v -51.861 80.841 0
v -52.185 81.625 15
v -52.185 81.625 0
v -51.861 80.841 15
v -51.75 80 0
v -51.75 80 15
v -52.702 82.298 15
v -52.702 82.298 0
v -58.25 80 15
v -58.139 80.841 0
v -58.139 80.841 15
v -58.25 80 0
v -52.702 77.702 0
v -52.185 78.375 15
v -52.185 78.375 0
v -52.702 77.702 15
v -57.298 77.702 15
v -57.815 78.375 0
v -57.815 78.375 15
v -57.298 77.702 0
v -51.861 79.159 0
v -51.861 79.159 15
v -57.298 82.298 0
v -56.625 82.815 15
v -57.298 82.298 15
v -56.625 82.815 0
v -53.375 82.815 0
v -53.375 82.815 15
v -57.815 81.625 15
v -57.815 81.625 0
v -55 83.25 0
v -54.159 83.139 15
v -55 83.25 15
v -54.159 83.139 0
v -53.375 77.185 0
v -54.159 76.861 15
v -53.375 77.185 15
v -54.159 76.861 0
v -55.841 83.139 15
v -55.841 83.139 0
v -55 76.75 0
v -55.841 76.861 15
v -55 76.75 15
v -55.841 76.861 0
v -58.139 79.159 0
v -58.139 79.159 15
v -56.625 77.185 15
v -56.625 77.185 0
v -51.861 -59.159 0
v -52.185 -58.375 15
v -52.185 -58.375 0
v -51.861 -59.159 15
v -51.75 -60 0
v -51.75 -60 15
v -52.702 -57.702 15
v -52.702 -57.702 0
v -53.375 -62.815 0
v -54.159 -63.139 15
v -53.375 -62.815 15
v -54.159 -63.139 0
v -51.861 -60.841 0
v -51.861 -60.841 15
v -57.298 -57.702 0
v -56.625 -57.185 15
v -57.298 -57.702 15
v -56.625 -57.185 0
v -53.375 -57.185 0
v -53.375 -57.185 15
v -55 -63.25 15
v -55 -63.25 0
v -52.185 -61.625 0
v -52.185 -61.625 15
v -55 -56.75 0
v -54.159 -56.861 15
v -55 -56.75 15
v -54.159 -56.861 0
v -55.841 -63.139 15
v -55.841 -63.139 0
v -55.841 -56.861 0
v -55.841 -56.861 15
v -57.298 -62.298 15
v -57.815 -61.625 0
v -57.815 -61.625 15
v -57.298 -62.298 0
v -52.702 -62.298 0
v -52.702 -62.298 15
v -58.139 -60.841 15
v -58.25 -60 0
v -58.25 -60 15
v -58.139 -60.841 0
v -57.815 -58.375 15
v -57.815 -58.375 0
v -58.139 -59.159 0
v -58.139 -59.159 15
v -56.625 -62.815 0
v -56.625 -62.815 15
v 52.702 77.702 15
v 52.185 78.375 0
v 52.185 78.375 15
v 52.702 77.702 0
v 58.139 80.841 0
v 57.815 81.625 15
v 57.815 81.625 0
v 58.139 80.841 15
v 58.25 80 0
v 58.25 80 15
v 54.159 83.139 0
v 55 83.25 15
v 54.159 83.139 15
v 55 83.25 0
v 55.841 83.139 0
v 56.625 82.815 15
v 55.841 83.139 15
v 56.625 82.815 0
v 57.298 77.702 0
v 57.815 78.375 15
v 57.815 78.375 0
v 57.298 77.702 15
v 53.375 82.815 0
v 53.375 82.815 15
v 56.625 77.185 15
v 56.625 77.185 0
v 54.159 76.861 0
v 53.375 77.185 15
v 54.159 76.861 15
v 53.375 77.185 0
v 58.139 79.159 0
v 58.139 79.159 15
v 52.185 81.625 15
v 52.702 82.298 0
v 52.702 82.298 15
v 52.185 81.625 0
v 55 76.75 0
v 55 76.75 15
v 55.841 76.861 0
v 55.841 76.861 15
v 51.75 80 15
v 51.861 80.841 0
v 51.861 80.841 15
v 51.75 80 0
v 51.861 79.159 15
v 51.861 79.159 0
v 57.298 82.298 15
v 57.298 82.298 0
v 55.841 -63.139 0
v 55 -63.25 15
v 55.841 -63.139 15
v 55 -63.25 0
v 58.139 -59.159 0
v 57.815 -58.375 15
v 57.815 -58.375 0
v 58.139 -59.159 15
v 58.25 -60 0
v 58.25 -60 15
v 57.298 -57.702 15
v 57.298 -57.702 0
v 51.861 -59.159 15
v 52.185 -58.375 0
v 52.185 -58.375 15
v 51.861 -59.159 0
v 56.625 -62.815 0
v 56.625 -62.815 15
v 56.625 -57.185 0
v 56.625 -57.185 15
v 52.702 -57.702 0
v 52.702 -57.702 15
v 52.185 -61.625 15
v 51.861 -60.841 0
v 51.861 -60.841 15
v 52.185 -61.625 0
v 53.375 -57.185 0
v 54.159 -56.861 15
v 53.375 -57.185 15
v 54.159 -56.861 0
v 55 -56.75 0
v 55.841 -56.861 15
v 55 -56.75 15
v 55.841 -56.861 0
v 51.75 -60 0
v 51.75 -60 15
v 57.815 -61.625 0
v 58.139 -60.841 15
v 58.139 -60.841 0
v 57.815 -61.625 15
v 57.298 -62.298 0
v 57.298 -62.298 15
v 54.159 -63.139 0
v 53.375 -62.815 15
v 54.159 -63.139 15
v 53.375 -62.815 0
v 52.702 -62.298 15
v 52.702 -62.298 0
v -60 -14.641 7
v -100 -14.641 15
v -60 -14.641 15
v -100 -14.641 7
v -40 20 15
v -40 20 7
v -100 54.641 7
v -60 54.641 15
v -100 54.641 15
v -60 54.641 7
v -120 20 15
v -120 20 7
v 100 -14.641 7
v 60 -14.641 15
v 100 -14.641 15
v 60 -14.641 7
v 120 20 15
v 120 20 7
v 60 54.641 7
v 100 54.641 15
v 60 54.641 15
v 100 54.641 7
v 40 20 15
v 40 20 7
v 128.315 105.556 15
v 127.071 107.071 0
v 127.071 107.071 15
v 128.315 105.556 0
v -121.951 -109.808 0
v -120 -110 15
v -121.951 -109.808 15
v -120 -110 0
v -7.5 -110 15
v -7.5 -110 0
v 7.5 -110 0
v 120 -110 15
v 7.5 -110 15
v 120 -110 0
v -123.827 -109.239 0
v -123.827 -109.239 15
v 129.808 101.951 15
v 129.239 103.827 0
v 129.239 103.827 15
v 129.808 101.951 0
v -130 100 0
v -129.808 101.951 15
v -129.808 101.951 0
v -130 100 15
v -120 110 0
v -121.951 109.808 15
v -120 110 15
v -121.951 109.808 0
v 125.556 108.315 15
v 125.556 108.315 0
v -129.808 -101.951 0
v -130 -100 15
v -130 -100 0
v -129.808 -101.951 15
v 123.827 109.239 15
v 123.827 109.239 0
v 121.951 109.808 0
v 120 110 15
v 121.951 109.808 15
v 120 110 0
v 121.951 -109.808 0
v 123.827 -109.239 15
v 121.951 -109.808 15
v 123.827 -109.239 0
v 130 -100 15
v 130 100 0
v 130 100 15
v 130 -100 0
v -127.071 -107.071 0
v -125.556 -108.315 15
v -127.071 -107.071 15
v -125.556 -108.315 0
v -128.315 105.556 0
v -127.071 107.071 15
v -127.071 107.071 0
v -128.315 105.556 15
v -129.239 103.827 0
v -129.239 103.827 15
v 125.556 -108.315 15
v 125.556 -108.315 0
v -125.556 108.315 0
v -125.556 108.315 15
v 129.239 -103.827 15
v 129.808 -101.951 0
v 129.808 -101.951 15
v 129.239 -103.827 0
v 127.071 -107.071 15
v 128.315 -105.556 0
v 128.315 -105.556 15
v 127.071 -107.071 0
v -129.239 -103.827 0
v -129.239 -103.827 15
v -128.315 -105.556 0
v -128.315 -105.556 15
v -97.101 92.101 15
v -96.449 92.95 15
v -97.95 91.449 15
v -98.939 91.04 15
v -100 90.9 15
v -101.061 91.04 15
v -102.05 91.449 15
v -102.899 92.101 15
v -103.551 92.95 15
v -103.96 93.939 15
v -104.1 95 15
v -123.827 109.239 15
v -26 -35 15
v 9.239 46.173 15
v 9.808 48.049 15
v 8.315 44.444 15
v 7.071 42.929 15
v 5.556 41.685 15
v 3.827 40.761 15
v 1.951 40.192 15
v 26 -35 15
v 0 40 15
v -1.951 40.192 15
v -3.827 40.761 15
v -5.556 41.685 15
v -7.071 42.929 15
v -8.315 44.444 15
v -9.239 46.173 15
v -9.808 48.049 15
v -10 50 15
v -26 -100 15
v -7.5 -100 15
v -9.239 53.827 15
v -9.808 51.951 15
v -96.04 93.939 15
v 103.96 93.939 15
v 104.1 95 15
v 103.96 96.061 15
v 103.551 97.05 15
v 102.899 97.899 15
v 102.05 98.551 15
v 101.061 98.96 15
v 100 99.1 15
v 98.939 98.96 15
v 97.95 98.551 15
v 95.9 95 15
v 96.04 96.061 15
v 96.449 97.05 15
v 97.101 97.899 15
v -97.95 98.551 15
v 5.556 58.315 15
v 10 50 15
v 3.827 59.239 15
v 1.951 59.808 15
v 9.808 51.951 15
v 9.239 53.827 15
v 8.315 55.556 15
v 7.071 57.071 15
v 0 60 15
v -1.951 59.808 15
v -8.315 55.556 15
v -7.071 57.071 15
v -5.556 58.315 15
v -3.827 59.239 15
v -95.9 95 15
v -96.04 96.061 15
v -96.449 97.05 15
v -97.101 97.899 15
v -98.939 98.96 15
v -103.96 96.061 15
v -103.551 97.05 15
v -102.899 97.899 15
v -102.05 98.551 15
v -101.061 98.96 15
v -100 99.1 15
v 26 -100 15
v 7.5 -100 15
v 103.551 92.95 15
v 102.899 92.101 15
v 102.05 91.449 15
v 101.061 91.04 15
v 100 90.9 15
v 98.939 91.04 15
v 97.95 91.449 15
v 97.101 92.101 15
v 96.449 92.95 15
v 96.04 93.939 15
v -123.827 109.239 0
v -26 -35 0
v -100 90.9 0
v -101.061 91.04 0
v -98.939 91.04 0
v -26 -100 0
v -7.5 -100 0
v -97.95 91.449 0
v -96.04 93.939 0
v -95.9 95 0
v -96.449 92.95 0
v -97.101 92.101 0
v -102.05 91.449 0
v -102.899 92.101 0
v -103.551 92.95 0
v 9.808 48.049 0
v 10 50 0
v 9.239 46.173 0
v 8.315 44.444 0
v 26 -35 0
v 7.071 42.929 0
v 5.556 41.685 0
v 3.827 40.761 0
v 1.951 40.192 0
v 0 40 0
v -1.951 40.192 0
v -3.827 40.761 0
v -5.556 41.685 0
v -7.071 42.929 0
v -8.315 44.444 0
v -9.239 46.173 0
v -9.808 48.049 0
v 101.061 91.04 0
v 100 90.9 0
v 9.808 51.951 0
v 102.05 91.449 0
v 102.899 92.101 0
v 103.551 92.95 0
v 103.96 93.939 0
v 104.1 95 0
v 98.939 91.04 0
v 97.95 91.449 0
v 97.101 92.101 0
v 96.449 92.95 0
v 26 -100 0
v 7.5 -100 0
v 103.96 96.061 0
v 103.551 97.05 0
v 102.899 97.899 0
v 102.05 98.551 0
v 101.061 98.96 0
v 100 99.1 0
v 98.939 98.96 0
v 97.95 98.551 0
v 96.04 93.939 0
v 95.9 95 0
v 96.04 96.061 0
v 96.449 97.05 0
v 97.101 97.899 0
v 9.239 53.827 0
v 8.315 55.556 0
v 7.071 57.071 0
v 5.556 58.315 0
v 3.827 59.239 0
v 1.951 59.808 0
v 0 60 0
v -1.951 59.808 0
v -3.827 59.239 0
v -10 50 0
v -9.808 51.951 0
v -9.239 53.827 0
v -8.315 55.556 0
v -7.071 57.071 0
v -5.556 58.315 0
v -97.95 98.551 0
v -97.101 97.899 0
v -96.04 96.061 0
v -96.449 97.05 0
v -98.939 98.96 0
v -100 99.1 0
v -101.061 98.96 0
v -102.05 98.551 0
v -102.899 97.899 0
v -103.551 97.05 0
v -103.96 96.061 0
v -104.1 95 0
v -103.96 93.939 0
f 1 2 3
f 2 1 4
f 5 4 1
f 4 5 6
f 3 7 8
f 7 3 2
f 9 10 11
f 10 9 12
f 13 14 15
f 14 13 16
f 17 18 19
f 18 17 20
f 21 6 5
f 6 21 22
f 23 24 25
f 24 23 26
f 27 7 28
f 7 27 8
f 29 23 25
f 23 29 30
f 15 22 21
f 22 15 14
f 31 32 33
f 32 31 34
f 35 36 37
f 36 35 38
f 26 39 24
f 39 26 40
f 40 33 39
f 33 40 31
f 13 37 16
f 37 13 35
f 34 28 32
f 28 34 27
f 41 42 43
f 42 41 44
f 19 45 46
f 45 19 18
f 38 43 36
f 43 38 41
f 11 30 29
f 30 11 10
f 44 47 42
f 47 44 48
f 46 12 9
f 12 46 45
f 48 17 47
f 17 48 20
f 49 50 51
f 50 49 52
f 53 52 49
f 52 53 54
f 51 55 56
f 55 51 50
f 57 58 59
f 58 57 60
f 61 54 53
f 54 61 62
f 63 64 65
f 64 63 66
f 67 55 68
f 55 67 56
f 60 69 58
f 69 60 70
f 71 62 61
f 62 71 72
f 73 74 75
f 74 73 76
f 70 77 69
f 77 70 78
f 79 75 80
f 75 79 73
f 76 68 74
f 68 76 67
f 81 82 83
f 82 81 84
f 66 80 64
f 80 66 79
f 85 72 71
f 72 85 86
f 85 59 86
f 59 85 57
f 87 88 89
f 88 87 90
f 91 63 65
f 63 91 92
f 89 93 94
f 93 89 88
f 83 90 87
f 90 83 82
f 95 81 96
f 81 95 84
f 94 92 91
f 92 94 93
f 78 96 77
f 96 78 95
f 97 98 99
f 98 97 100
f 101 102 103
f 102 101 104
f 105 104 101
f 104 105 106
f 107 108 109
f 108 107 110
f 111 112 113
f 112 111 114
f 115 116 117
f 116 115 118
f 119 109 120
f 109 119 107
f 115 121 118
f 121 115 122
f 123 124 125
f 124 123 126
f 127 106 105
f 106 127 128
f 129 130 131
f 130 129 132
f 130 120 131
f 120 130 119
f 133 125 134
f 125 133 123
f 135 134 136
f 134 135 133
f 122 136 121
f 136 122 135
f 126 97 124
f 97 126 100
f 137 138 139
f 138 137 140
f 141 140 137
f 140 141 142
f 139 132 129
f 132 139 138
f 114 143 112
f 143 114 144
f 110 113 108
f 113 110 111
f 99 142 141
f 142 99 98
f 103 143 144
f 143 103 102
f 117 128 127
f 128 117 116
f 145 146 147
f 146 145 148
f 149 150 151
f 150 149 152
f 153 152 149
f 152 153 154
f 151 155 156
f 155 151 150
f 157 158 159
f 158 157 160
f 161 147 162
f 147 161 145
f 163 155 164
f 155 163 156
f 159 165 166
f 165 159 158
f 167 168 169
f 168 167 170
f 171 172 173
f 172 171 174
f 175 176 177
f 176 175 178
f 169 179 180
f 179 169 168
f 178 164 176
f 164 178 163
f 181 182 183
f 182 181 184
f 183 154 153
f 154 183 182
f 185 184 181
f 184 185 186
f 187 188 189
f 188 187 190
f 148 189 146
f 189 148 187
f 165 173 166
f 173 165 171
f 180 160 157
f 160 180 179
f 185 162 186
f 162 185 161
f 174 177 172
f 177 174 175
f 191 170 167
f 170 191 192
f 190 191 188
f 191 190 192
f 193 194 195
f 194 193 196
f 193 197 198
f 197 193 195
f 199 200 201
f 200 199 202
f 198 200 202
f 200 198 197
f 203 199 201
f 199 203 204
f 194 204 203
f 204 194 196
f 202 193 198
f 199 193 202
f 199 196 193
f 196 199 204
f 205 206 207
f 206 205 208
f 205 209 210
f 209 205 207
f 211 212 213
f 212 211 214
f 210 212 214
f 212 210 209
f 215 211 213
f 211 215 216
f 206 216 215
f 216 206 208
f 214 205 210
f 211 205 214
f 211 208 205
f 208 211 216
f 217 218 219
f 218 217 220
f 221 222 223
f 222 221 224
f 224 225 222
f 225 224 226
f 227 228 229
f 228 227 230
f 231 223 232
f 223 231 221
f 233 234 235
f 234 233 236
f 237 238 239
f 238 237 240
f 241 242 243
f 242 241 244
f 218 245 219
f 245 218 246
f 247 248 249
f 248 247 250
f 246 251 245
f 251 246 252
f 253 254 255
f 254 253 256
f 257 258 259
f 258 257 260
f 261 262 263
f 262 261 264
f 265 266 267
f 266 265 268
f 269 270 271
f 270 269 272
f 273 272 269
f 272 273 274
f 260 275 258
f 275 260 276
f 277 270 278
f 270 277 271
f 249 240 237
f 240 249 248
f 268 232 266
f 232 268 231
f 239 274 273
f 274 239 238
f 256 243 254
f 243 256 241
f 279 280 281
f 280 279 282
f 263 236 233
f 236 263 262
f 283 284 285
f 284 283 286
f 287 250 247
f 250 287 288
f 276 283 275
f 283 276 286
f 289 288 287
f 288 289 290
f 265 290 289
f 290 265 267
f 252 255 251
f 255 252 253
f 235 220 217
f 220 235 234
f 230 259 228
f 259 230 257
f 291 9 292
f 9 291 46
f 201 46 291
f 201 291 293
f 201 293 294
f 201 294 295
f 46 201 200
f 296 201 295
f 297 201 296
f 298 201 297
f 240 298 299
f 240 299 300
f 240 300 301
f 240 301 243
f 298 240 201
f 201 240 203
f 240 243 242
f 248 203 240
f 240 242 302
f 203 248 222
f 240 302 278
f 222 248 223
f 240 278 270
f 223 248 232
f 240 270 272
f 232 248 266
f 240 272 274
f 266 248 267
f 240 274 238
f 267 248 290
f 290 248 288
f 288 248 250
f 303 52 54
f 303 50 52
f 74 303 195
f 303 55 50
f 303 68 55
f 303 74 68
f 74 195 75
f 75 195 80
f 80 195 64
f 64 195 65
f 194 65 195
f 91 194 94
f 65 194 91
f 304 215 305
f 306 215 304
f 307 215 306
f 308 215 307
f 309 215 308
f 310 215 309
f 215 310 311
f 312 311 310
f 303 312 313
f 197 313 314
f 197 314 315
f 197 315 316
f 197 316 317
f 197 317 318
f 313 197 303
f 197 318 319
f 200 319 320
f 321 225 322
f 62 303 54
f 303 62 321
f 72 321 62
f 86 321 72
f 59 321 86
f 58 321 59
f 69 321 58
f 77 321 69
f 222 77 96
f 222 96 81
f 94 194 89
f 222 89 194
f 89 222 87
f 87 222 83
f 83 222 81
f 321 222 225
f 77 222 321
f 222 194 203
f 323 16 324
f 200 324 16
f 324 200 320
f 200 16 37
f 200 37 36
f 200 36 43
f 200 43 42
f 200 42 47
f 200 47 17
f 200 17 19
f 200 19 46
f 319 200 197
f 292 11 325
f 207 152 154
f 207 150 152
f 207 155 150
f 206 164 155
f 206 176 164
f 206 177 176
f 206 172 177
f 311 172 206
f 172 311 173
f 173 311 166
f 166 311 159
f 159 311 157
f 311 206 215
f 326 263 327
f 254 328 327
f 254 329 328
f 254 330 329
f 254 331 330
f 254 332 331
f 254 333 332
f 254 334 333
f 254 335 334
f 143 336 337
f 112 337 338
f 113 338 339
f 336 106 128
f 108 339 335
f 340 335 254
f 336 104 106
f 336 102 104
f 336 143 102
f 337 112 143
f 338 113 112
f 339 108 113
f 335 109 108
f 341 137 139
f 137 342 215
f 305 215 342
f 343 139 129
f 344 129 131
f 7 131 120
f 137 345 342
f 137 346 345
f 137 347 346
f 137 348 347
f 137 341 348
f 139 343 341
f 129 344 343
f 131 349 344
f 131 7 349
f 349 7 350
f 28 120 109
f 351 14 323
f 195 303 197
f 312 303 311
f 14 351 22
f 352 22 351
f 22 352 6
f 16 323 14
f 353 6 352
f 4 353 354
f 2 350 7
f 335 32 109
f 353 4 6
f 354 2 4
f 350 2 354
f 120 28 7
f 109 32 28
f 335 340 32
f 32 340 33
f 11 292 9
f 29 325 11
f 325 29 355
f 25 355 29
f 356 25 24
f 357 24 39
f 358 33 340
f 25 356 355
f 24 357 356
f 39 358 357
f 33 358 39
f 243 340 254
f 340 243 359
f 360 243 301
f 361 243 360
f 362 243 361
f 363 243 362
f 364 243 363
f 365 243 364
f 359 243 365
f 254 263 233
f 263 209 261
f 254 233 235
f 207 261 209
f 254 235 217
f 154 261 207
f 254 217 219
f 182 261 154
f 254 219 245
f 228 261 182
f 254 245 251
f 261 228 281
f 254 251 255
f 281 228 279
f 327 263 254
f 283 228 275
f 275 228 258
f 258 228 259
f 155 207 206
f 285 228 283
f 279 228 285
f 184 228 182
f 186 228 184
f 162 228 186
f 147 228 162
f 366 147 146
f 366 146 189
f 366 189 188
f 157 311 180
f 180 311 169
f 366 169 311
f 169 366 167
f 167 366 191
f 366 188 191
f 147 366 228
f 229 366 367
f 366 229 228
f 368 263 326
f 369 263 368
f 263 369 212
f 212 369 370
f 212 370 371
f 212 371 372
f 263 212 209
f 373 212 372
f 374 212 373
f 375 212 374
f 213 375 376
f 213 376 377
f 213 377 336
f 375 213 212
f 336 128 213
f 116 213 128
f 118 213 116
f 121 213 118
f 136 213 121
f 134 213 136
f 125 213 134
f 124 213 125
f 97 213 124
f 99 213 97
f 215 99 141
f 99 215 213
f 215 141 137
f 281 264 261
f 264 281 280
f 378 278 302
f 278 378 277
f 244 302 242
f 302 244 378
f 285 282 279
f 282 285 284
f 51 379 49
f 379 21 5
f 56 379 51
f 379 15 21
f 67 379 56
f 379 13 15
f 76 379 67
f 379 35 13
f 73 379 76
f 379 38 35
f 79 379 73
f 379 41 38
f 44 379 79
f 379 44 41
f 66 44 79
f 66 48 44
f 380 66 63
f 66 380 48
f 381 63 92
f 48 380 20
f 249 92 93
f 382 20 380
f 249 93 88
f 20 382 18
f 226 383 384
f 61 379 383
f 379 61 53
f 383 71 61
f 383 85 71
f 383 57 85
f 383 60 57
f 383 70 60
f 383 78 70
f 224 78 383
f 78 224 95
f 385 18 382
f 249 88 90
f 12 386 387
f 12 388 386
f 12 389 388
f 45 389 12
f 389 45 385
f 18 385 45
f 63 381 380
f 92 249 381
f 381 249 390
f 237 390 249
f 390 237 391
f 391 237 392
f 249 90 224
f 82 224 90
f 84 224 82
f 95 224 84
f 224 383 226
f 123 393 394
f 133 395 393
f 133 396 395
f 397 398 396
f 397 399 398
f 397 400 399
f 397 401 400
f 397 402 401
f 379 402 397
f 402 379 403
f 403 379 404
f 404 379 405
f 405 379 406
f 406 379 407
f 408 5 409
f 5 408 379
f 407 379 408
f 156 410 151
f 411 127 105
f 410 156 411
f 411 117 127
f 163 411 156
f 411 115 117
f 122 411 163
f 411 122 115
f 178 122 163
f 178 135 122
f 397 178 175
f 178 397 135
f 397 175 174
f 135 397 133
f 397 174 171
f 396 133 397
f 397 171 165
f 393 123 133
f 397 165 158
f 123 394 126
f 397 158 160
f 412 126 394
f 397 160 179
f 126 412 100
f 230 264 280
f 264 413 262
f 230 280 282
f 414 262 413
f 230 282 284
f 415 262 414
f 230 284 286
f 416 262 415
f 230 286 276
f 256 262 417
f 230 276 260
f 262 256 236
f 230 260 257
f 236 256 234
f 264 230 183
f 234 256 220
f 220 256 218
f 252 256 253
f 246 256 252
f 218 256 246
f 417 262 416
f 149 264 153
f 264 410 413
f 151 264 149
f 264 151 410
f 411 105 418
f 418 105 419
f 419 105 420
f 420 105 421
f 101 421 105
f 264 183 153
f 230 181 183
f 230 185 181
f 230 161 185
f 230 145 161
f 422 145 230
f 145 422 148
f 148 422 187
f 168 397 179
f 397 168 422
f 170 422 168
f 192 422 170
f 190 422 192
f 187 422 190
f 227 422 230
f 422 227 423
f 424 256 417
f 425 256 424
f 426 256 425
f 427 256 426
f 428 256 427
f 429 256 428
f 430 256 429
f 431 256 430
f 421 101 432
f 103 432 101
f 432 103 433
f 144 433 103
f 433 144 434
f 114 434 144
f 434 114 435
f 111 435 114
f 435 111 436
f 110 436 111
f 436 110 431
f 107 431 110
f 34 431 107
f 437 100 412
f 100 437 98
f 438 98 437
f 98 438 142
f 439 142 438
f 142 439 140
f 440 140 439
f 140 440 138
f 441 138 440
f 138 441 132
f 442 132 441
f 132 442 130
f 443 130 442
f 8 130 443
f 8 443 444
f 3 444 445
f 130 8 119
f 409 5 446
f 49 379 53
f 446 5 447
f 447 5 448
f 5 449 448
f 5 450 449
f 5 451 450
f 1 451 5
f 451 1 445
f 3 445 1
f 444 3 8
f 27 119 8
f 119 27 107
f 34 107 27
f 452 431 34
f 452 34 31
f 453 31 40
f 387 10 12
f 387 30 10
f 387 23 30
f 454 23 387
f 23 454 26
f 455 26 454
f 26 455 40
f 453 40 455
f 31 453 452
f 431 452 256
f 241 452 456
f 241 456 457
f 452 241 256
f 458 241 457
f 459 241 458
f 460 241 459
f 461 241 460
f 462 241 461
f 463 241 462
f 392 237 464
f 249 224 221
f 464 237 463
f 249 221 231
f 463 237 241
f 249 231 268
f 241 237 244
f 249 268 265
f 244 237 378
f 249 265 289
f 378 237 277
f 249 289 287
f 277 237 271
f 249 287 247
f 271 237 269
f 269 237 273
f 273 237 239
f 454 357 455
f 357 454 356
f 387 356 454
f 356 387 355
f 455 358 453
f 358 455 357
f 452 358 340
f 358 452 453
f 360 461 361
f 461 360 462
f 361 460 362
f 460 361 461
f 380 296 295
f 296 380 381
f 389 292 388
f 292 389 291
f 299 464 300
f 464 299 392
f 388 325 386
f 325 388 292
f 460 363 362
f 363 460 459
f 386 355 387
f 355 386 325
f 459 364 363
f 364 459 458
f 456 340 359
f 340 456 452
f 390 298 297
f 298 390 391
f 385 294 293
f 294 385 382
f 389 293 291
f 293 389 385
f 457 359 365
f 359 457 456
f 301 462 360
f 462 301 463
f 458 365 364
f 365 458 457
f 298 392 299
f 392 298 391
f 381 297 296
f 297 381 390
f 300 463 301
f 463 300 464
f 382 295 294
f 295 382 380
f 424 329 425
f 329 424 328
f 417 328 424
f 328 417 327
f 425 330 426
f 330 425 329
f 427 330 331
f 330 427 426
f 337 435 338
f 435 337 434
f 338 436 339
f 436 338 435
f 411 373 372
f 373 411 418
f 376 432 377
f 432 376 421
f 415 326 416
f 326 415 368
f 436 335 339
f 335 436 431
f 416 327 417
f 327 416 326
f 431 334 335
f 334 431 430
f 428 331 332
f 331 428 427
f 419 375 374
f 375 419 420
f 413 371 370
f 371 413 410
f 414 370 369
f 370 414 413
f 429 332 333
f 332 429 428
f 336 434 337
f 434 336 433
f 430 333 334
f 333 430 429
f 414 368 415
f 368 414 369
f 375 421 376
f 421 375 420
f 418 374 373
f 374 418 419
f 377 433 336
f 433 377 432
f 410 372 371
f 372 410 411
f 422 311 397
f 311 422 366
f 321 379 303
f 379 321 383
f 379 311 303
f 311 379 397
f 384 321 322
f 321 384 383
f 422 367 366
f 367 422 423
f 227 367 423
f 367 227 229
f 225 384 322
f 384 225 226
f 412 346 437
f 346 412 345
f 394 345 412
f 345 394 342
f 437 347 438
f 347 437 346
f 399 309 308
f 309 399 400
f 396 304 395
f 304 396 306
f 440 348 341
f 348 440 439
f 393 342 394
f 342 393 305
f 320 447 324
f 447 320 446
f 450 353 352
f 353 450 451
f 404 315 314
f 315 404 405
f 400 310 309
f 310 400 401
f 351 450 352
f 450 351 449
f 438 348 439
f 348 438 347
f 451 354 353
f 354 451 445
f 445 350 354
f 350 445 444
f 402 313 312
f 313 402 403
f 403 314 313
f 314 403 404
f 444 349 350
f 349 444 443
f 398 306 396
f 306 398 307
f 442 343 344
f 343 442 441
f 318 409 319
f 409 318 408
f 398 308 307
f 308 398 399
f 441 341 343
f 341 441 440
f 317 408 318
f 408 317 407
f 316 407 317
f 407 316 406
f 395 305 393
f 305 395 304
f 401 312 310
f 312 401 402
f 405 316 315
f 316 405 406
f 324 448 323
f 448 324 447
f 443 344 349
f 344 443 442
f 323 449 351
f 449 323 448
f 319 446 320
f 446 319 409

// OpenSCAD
// ============================================================
// HEM-001 — Latitude Adjustment Base: ALTITUDE PLATE
// The upper tilting plate. The RA polar spine bolts to the
// top face of this plate. Tilts on hinge pivot to set latitude.
// Material: 6061-T6 Aluminium, 15mm thick
// Part No: HEM-LAT-002
// Revision: 1.0 | 2026-06
// ============================================================
//
// FUNCTION:
// This plate is hinged at its REAR edge (south side) to the
// azimuth plate hinge brackets. The FRONT edge is raised by
// a tangent arm / lead screw drive to set the tilt angle
// (latitude). Range: 0–70° (covers all UK latitudes and most
// of the world).
//
// Latitude for Stockport: 53.41° — set once, lock, leave.
//
// FEATURES:
// - Hinge pivot holes (rear edge, 2× M8 pivot bolts, 200mm apart)
// - Tangent arm socket (front underside — M8 tapped boss)
// - RA polar spine attachment holes (top face, 4× M6, matching spine)
// - Counterweight shaft clearance (Ø25mm slot — CW swings through)
// - Latitude scale window (10mm wide slot at front edge — scale visible
//   through window from outside)
// - Lightening pockets (top face — saves ~20% material)
//
// TANGENT ARM GEOMETRY:
// The tangent arm mechanism converts linear motion (M8 lead screw)
// into angular tilt. For a 100mm pivot-to-contact length:
//   θ = arctan(L / 100)   where L is lead screw extension
//   At 53°: L = 100 × tan(53.41°) = 134.6mm
//   1mm of screw movement ≈ 0.57° at 53° (coarser near vertical,
//   finer near horizontal — adequate for field setup)
// ============================================================

// ---- PARAMETERS ----
PLATE_W         = 260;    // mm — plate width
PLATE_D         = 220;    // mm — plate depth (front-back)
PLATE_T         = 15;     // mm — thickness

// Hinge pivot holes (rear edge — pivots are M8 bolts through hinge brackets)
HINGE_SPACING   = 200;    // mm — matches azimuth plate
HINGE_INSET_Y   = 15;     // mm — inset from rear edge
HINGE_BORE      = 8.2;    // mm — M8 clearance

// Tangent arm socket (front underside — M8 tapped, vertical)
TANGENT_X       = 0;      // centred
TANGENT_INSET_Y = 30;     // mm inset from front edge
TANGENT_BORE    = 6.8;    // mm — M8 tapping pilot (6.75mm)

// RA polar spine attachment (top face — 4× M6, matching PolarAxis_Spine.scad)
// Spine is 120mm wide, mounting holes at ±55mm X, inset from rear
SPINE_HOLE_X    = 55;     // mm — half spacing X
SPINE_HOLE_Y1   = PLATE_D/2 - 30;   // rear pair
SPINE_HOLE_Y2   = PLATE_D/2 - 30 - 140; // front pair (140mm spine hole spacing)
SPINE_BOLT      = 6.5;    // mm — M6 clearance (spine has M6 clearance too)

// Counterweight shaft clearance
// CW shaft swings through when slewing — needs ~50mm wide × 60mm deep slot
CW_SLOT_W       = 52;
CW_SLOT_D       = 65;
CW_SLOT_X       = 0;      // centred
CW_SLOT_Y       = -PLATE_D/2 + CW_SLOT_D/2 + 10; // near front edge

// Latitude scale window (front edge, centred)
LAT_WINDOW_W    = 15;
LAT_WINDOW_H    = 20;
LAT_WINDOW_Y    = -PLATE_D/2 + 8;  // front edge

// Corner radius
CR = 10;

// ---- GEOMETRY ----

module alt_plate() {
    difference() {
        // Base plate
        hull() {
            for (x = [-PLATE_W/2 + CR, PLATE_W/2 - CR])
                for (y = [-PLATE_D/2 + CR, PLATE_D/2 - CR])
                    translate([x, y, 0]) cylinder(r=CR, h=PLATE_T, $fn=32);
        }

        // ---- HINGE PIVOT HOLES (rear edge) ----
        translate([-HINGE_SPACING/2, PLATE_D/2 - HINGE_INSET_Y, -0.5])
            cylinder(d=HINGE_BORE, h=PLATE_T+1, $fn=24);
        translate([HINGE_SPACING/2, PLATE_D/2 - HINGE_INSET_Y, -0.5])
            cylinder(d=HINGE_BORE, h=PLATE_T+1, $fn=24);

        // ---- TANGENT ARM SOCKET (front underside — tapped M8) ----
        // Blind hole from BOTTOM face, depth 20mm
        translate([TANGENT_X, -PLATE_D/2 + TANGENT_INSET_Y, -0.5])
            cylinder(d=TANGENT_BORE, h=20+0.5, $fn=24);

        // ---- RA POLAR SPINE ATTACHMENT (top face, 4× M6 clearance) ----
        for (sign = [-1, 1]) {
            translate([sign*SPINE_HOLE_X, SPINE_HOLE_Y1, -0.5])
                cylinder(d=SPINE_BOLT, h=PLATE_T+1, $fn=24);
            translate([sign*SPINE_HOLE_X, SPINE_HOLE_Y2, -0.5])
                cylinder(d=SPINE_BOLT, h=PLATE_T+1, $fn=24);
        }

        // ---- COUNTERWEIGHT SHAFT CLEARANCE SLOT ----
        translate([CW_SLOT_X - CW_SLOT_W/2, CW_SLOT_Y - CW_SLOT_D/2, -0.5])
            cube([CW_SLOT_W, CW_SLOT_D, PLATE_T+1]);

        // ---- LATITUDE SCALE WINDOW (front edge) ----
        translate([-LAT_WINDOW_W/2, LAT_WINDOW_Y - LAT_WINDOW_H/2, -0.5])
            cube([LAT_WINDOW_W, LAT_WINDOW_H, PLATE_T+1]);

        // ---- LIGHTENING POCKETS (top face — 2 pockets either side) ----
        for (sign = [-1, 1]) {
            translate([sign * 80, 20, PLATE_T - 8])
                cylinder(r=40, h=8.5, $fn=6);  // hexagonal pockets, 8mm deep blind
        }

        // ---- CABLE MANAGEMENT HOLE (central, Ø20mm) ----
        // Routes motor and encoder cables through plate
        translate([0, 50, -0.5])
            cylinder(d=20, h=PLATE_T+1, $fn=32);
    }
}

alt_plate();

// ============================================================
// ASSEMBLY NOTE:
// The altitude plate sits ABOVE the azimuth plate, hinged at rear.
// Hinge brackets (LatBase_HingeBracket.scad) clamp between them.
// The tangent arm block (LatBase_TangentArmBlock.scad) rides under
// the front of this plate, driven by the M8 lead screw.
// Once latitude is set, the altitude knob locks the lead screw.
// A locking bolt through a separate clamp (M6 × 2) adds secondary lock.
// ============================================================
